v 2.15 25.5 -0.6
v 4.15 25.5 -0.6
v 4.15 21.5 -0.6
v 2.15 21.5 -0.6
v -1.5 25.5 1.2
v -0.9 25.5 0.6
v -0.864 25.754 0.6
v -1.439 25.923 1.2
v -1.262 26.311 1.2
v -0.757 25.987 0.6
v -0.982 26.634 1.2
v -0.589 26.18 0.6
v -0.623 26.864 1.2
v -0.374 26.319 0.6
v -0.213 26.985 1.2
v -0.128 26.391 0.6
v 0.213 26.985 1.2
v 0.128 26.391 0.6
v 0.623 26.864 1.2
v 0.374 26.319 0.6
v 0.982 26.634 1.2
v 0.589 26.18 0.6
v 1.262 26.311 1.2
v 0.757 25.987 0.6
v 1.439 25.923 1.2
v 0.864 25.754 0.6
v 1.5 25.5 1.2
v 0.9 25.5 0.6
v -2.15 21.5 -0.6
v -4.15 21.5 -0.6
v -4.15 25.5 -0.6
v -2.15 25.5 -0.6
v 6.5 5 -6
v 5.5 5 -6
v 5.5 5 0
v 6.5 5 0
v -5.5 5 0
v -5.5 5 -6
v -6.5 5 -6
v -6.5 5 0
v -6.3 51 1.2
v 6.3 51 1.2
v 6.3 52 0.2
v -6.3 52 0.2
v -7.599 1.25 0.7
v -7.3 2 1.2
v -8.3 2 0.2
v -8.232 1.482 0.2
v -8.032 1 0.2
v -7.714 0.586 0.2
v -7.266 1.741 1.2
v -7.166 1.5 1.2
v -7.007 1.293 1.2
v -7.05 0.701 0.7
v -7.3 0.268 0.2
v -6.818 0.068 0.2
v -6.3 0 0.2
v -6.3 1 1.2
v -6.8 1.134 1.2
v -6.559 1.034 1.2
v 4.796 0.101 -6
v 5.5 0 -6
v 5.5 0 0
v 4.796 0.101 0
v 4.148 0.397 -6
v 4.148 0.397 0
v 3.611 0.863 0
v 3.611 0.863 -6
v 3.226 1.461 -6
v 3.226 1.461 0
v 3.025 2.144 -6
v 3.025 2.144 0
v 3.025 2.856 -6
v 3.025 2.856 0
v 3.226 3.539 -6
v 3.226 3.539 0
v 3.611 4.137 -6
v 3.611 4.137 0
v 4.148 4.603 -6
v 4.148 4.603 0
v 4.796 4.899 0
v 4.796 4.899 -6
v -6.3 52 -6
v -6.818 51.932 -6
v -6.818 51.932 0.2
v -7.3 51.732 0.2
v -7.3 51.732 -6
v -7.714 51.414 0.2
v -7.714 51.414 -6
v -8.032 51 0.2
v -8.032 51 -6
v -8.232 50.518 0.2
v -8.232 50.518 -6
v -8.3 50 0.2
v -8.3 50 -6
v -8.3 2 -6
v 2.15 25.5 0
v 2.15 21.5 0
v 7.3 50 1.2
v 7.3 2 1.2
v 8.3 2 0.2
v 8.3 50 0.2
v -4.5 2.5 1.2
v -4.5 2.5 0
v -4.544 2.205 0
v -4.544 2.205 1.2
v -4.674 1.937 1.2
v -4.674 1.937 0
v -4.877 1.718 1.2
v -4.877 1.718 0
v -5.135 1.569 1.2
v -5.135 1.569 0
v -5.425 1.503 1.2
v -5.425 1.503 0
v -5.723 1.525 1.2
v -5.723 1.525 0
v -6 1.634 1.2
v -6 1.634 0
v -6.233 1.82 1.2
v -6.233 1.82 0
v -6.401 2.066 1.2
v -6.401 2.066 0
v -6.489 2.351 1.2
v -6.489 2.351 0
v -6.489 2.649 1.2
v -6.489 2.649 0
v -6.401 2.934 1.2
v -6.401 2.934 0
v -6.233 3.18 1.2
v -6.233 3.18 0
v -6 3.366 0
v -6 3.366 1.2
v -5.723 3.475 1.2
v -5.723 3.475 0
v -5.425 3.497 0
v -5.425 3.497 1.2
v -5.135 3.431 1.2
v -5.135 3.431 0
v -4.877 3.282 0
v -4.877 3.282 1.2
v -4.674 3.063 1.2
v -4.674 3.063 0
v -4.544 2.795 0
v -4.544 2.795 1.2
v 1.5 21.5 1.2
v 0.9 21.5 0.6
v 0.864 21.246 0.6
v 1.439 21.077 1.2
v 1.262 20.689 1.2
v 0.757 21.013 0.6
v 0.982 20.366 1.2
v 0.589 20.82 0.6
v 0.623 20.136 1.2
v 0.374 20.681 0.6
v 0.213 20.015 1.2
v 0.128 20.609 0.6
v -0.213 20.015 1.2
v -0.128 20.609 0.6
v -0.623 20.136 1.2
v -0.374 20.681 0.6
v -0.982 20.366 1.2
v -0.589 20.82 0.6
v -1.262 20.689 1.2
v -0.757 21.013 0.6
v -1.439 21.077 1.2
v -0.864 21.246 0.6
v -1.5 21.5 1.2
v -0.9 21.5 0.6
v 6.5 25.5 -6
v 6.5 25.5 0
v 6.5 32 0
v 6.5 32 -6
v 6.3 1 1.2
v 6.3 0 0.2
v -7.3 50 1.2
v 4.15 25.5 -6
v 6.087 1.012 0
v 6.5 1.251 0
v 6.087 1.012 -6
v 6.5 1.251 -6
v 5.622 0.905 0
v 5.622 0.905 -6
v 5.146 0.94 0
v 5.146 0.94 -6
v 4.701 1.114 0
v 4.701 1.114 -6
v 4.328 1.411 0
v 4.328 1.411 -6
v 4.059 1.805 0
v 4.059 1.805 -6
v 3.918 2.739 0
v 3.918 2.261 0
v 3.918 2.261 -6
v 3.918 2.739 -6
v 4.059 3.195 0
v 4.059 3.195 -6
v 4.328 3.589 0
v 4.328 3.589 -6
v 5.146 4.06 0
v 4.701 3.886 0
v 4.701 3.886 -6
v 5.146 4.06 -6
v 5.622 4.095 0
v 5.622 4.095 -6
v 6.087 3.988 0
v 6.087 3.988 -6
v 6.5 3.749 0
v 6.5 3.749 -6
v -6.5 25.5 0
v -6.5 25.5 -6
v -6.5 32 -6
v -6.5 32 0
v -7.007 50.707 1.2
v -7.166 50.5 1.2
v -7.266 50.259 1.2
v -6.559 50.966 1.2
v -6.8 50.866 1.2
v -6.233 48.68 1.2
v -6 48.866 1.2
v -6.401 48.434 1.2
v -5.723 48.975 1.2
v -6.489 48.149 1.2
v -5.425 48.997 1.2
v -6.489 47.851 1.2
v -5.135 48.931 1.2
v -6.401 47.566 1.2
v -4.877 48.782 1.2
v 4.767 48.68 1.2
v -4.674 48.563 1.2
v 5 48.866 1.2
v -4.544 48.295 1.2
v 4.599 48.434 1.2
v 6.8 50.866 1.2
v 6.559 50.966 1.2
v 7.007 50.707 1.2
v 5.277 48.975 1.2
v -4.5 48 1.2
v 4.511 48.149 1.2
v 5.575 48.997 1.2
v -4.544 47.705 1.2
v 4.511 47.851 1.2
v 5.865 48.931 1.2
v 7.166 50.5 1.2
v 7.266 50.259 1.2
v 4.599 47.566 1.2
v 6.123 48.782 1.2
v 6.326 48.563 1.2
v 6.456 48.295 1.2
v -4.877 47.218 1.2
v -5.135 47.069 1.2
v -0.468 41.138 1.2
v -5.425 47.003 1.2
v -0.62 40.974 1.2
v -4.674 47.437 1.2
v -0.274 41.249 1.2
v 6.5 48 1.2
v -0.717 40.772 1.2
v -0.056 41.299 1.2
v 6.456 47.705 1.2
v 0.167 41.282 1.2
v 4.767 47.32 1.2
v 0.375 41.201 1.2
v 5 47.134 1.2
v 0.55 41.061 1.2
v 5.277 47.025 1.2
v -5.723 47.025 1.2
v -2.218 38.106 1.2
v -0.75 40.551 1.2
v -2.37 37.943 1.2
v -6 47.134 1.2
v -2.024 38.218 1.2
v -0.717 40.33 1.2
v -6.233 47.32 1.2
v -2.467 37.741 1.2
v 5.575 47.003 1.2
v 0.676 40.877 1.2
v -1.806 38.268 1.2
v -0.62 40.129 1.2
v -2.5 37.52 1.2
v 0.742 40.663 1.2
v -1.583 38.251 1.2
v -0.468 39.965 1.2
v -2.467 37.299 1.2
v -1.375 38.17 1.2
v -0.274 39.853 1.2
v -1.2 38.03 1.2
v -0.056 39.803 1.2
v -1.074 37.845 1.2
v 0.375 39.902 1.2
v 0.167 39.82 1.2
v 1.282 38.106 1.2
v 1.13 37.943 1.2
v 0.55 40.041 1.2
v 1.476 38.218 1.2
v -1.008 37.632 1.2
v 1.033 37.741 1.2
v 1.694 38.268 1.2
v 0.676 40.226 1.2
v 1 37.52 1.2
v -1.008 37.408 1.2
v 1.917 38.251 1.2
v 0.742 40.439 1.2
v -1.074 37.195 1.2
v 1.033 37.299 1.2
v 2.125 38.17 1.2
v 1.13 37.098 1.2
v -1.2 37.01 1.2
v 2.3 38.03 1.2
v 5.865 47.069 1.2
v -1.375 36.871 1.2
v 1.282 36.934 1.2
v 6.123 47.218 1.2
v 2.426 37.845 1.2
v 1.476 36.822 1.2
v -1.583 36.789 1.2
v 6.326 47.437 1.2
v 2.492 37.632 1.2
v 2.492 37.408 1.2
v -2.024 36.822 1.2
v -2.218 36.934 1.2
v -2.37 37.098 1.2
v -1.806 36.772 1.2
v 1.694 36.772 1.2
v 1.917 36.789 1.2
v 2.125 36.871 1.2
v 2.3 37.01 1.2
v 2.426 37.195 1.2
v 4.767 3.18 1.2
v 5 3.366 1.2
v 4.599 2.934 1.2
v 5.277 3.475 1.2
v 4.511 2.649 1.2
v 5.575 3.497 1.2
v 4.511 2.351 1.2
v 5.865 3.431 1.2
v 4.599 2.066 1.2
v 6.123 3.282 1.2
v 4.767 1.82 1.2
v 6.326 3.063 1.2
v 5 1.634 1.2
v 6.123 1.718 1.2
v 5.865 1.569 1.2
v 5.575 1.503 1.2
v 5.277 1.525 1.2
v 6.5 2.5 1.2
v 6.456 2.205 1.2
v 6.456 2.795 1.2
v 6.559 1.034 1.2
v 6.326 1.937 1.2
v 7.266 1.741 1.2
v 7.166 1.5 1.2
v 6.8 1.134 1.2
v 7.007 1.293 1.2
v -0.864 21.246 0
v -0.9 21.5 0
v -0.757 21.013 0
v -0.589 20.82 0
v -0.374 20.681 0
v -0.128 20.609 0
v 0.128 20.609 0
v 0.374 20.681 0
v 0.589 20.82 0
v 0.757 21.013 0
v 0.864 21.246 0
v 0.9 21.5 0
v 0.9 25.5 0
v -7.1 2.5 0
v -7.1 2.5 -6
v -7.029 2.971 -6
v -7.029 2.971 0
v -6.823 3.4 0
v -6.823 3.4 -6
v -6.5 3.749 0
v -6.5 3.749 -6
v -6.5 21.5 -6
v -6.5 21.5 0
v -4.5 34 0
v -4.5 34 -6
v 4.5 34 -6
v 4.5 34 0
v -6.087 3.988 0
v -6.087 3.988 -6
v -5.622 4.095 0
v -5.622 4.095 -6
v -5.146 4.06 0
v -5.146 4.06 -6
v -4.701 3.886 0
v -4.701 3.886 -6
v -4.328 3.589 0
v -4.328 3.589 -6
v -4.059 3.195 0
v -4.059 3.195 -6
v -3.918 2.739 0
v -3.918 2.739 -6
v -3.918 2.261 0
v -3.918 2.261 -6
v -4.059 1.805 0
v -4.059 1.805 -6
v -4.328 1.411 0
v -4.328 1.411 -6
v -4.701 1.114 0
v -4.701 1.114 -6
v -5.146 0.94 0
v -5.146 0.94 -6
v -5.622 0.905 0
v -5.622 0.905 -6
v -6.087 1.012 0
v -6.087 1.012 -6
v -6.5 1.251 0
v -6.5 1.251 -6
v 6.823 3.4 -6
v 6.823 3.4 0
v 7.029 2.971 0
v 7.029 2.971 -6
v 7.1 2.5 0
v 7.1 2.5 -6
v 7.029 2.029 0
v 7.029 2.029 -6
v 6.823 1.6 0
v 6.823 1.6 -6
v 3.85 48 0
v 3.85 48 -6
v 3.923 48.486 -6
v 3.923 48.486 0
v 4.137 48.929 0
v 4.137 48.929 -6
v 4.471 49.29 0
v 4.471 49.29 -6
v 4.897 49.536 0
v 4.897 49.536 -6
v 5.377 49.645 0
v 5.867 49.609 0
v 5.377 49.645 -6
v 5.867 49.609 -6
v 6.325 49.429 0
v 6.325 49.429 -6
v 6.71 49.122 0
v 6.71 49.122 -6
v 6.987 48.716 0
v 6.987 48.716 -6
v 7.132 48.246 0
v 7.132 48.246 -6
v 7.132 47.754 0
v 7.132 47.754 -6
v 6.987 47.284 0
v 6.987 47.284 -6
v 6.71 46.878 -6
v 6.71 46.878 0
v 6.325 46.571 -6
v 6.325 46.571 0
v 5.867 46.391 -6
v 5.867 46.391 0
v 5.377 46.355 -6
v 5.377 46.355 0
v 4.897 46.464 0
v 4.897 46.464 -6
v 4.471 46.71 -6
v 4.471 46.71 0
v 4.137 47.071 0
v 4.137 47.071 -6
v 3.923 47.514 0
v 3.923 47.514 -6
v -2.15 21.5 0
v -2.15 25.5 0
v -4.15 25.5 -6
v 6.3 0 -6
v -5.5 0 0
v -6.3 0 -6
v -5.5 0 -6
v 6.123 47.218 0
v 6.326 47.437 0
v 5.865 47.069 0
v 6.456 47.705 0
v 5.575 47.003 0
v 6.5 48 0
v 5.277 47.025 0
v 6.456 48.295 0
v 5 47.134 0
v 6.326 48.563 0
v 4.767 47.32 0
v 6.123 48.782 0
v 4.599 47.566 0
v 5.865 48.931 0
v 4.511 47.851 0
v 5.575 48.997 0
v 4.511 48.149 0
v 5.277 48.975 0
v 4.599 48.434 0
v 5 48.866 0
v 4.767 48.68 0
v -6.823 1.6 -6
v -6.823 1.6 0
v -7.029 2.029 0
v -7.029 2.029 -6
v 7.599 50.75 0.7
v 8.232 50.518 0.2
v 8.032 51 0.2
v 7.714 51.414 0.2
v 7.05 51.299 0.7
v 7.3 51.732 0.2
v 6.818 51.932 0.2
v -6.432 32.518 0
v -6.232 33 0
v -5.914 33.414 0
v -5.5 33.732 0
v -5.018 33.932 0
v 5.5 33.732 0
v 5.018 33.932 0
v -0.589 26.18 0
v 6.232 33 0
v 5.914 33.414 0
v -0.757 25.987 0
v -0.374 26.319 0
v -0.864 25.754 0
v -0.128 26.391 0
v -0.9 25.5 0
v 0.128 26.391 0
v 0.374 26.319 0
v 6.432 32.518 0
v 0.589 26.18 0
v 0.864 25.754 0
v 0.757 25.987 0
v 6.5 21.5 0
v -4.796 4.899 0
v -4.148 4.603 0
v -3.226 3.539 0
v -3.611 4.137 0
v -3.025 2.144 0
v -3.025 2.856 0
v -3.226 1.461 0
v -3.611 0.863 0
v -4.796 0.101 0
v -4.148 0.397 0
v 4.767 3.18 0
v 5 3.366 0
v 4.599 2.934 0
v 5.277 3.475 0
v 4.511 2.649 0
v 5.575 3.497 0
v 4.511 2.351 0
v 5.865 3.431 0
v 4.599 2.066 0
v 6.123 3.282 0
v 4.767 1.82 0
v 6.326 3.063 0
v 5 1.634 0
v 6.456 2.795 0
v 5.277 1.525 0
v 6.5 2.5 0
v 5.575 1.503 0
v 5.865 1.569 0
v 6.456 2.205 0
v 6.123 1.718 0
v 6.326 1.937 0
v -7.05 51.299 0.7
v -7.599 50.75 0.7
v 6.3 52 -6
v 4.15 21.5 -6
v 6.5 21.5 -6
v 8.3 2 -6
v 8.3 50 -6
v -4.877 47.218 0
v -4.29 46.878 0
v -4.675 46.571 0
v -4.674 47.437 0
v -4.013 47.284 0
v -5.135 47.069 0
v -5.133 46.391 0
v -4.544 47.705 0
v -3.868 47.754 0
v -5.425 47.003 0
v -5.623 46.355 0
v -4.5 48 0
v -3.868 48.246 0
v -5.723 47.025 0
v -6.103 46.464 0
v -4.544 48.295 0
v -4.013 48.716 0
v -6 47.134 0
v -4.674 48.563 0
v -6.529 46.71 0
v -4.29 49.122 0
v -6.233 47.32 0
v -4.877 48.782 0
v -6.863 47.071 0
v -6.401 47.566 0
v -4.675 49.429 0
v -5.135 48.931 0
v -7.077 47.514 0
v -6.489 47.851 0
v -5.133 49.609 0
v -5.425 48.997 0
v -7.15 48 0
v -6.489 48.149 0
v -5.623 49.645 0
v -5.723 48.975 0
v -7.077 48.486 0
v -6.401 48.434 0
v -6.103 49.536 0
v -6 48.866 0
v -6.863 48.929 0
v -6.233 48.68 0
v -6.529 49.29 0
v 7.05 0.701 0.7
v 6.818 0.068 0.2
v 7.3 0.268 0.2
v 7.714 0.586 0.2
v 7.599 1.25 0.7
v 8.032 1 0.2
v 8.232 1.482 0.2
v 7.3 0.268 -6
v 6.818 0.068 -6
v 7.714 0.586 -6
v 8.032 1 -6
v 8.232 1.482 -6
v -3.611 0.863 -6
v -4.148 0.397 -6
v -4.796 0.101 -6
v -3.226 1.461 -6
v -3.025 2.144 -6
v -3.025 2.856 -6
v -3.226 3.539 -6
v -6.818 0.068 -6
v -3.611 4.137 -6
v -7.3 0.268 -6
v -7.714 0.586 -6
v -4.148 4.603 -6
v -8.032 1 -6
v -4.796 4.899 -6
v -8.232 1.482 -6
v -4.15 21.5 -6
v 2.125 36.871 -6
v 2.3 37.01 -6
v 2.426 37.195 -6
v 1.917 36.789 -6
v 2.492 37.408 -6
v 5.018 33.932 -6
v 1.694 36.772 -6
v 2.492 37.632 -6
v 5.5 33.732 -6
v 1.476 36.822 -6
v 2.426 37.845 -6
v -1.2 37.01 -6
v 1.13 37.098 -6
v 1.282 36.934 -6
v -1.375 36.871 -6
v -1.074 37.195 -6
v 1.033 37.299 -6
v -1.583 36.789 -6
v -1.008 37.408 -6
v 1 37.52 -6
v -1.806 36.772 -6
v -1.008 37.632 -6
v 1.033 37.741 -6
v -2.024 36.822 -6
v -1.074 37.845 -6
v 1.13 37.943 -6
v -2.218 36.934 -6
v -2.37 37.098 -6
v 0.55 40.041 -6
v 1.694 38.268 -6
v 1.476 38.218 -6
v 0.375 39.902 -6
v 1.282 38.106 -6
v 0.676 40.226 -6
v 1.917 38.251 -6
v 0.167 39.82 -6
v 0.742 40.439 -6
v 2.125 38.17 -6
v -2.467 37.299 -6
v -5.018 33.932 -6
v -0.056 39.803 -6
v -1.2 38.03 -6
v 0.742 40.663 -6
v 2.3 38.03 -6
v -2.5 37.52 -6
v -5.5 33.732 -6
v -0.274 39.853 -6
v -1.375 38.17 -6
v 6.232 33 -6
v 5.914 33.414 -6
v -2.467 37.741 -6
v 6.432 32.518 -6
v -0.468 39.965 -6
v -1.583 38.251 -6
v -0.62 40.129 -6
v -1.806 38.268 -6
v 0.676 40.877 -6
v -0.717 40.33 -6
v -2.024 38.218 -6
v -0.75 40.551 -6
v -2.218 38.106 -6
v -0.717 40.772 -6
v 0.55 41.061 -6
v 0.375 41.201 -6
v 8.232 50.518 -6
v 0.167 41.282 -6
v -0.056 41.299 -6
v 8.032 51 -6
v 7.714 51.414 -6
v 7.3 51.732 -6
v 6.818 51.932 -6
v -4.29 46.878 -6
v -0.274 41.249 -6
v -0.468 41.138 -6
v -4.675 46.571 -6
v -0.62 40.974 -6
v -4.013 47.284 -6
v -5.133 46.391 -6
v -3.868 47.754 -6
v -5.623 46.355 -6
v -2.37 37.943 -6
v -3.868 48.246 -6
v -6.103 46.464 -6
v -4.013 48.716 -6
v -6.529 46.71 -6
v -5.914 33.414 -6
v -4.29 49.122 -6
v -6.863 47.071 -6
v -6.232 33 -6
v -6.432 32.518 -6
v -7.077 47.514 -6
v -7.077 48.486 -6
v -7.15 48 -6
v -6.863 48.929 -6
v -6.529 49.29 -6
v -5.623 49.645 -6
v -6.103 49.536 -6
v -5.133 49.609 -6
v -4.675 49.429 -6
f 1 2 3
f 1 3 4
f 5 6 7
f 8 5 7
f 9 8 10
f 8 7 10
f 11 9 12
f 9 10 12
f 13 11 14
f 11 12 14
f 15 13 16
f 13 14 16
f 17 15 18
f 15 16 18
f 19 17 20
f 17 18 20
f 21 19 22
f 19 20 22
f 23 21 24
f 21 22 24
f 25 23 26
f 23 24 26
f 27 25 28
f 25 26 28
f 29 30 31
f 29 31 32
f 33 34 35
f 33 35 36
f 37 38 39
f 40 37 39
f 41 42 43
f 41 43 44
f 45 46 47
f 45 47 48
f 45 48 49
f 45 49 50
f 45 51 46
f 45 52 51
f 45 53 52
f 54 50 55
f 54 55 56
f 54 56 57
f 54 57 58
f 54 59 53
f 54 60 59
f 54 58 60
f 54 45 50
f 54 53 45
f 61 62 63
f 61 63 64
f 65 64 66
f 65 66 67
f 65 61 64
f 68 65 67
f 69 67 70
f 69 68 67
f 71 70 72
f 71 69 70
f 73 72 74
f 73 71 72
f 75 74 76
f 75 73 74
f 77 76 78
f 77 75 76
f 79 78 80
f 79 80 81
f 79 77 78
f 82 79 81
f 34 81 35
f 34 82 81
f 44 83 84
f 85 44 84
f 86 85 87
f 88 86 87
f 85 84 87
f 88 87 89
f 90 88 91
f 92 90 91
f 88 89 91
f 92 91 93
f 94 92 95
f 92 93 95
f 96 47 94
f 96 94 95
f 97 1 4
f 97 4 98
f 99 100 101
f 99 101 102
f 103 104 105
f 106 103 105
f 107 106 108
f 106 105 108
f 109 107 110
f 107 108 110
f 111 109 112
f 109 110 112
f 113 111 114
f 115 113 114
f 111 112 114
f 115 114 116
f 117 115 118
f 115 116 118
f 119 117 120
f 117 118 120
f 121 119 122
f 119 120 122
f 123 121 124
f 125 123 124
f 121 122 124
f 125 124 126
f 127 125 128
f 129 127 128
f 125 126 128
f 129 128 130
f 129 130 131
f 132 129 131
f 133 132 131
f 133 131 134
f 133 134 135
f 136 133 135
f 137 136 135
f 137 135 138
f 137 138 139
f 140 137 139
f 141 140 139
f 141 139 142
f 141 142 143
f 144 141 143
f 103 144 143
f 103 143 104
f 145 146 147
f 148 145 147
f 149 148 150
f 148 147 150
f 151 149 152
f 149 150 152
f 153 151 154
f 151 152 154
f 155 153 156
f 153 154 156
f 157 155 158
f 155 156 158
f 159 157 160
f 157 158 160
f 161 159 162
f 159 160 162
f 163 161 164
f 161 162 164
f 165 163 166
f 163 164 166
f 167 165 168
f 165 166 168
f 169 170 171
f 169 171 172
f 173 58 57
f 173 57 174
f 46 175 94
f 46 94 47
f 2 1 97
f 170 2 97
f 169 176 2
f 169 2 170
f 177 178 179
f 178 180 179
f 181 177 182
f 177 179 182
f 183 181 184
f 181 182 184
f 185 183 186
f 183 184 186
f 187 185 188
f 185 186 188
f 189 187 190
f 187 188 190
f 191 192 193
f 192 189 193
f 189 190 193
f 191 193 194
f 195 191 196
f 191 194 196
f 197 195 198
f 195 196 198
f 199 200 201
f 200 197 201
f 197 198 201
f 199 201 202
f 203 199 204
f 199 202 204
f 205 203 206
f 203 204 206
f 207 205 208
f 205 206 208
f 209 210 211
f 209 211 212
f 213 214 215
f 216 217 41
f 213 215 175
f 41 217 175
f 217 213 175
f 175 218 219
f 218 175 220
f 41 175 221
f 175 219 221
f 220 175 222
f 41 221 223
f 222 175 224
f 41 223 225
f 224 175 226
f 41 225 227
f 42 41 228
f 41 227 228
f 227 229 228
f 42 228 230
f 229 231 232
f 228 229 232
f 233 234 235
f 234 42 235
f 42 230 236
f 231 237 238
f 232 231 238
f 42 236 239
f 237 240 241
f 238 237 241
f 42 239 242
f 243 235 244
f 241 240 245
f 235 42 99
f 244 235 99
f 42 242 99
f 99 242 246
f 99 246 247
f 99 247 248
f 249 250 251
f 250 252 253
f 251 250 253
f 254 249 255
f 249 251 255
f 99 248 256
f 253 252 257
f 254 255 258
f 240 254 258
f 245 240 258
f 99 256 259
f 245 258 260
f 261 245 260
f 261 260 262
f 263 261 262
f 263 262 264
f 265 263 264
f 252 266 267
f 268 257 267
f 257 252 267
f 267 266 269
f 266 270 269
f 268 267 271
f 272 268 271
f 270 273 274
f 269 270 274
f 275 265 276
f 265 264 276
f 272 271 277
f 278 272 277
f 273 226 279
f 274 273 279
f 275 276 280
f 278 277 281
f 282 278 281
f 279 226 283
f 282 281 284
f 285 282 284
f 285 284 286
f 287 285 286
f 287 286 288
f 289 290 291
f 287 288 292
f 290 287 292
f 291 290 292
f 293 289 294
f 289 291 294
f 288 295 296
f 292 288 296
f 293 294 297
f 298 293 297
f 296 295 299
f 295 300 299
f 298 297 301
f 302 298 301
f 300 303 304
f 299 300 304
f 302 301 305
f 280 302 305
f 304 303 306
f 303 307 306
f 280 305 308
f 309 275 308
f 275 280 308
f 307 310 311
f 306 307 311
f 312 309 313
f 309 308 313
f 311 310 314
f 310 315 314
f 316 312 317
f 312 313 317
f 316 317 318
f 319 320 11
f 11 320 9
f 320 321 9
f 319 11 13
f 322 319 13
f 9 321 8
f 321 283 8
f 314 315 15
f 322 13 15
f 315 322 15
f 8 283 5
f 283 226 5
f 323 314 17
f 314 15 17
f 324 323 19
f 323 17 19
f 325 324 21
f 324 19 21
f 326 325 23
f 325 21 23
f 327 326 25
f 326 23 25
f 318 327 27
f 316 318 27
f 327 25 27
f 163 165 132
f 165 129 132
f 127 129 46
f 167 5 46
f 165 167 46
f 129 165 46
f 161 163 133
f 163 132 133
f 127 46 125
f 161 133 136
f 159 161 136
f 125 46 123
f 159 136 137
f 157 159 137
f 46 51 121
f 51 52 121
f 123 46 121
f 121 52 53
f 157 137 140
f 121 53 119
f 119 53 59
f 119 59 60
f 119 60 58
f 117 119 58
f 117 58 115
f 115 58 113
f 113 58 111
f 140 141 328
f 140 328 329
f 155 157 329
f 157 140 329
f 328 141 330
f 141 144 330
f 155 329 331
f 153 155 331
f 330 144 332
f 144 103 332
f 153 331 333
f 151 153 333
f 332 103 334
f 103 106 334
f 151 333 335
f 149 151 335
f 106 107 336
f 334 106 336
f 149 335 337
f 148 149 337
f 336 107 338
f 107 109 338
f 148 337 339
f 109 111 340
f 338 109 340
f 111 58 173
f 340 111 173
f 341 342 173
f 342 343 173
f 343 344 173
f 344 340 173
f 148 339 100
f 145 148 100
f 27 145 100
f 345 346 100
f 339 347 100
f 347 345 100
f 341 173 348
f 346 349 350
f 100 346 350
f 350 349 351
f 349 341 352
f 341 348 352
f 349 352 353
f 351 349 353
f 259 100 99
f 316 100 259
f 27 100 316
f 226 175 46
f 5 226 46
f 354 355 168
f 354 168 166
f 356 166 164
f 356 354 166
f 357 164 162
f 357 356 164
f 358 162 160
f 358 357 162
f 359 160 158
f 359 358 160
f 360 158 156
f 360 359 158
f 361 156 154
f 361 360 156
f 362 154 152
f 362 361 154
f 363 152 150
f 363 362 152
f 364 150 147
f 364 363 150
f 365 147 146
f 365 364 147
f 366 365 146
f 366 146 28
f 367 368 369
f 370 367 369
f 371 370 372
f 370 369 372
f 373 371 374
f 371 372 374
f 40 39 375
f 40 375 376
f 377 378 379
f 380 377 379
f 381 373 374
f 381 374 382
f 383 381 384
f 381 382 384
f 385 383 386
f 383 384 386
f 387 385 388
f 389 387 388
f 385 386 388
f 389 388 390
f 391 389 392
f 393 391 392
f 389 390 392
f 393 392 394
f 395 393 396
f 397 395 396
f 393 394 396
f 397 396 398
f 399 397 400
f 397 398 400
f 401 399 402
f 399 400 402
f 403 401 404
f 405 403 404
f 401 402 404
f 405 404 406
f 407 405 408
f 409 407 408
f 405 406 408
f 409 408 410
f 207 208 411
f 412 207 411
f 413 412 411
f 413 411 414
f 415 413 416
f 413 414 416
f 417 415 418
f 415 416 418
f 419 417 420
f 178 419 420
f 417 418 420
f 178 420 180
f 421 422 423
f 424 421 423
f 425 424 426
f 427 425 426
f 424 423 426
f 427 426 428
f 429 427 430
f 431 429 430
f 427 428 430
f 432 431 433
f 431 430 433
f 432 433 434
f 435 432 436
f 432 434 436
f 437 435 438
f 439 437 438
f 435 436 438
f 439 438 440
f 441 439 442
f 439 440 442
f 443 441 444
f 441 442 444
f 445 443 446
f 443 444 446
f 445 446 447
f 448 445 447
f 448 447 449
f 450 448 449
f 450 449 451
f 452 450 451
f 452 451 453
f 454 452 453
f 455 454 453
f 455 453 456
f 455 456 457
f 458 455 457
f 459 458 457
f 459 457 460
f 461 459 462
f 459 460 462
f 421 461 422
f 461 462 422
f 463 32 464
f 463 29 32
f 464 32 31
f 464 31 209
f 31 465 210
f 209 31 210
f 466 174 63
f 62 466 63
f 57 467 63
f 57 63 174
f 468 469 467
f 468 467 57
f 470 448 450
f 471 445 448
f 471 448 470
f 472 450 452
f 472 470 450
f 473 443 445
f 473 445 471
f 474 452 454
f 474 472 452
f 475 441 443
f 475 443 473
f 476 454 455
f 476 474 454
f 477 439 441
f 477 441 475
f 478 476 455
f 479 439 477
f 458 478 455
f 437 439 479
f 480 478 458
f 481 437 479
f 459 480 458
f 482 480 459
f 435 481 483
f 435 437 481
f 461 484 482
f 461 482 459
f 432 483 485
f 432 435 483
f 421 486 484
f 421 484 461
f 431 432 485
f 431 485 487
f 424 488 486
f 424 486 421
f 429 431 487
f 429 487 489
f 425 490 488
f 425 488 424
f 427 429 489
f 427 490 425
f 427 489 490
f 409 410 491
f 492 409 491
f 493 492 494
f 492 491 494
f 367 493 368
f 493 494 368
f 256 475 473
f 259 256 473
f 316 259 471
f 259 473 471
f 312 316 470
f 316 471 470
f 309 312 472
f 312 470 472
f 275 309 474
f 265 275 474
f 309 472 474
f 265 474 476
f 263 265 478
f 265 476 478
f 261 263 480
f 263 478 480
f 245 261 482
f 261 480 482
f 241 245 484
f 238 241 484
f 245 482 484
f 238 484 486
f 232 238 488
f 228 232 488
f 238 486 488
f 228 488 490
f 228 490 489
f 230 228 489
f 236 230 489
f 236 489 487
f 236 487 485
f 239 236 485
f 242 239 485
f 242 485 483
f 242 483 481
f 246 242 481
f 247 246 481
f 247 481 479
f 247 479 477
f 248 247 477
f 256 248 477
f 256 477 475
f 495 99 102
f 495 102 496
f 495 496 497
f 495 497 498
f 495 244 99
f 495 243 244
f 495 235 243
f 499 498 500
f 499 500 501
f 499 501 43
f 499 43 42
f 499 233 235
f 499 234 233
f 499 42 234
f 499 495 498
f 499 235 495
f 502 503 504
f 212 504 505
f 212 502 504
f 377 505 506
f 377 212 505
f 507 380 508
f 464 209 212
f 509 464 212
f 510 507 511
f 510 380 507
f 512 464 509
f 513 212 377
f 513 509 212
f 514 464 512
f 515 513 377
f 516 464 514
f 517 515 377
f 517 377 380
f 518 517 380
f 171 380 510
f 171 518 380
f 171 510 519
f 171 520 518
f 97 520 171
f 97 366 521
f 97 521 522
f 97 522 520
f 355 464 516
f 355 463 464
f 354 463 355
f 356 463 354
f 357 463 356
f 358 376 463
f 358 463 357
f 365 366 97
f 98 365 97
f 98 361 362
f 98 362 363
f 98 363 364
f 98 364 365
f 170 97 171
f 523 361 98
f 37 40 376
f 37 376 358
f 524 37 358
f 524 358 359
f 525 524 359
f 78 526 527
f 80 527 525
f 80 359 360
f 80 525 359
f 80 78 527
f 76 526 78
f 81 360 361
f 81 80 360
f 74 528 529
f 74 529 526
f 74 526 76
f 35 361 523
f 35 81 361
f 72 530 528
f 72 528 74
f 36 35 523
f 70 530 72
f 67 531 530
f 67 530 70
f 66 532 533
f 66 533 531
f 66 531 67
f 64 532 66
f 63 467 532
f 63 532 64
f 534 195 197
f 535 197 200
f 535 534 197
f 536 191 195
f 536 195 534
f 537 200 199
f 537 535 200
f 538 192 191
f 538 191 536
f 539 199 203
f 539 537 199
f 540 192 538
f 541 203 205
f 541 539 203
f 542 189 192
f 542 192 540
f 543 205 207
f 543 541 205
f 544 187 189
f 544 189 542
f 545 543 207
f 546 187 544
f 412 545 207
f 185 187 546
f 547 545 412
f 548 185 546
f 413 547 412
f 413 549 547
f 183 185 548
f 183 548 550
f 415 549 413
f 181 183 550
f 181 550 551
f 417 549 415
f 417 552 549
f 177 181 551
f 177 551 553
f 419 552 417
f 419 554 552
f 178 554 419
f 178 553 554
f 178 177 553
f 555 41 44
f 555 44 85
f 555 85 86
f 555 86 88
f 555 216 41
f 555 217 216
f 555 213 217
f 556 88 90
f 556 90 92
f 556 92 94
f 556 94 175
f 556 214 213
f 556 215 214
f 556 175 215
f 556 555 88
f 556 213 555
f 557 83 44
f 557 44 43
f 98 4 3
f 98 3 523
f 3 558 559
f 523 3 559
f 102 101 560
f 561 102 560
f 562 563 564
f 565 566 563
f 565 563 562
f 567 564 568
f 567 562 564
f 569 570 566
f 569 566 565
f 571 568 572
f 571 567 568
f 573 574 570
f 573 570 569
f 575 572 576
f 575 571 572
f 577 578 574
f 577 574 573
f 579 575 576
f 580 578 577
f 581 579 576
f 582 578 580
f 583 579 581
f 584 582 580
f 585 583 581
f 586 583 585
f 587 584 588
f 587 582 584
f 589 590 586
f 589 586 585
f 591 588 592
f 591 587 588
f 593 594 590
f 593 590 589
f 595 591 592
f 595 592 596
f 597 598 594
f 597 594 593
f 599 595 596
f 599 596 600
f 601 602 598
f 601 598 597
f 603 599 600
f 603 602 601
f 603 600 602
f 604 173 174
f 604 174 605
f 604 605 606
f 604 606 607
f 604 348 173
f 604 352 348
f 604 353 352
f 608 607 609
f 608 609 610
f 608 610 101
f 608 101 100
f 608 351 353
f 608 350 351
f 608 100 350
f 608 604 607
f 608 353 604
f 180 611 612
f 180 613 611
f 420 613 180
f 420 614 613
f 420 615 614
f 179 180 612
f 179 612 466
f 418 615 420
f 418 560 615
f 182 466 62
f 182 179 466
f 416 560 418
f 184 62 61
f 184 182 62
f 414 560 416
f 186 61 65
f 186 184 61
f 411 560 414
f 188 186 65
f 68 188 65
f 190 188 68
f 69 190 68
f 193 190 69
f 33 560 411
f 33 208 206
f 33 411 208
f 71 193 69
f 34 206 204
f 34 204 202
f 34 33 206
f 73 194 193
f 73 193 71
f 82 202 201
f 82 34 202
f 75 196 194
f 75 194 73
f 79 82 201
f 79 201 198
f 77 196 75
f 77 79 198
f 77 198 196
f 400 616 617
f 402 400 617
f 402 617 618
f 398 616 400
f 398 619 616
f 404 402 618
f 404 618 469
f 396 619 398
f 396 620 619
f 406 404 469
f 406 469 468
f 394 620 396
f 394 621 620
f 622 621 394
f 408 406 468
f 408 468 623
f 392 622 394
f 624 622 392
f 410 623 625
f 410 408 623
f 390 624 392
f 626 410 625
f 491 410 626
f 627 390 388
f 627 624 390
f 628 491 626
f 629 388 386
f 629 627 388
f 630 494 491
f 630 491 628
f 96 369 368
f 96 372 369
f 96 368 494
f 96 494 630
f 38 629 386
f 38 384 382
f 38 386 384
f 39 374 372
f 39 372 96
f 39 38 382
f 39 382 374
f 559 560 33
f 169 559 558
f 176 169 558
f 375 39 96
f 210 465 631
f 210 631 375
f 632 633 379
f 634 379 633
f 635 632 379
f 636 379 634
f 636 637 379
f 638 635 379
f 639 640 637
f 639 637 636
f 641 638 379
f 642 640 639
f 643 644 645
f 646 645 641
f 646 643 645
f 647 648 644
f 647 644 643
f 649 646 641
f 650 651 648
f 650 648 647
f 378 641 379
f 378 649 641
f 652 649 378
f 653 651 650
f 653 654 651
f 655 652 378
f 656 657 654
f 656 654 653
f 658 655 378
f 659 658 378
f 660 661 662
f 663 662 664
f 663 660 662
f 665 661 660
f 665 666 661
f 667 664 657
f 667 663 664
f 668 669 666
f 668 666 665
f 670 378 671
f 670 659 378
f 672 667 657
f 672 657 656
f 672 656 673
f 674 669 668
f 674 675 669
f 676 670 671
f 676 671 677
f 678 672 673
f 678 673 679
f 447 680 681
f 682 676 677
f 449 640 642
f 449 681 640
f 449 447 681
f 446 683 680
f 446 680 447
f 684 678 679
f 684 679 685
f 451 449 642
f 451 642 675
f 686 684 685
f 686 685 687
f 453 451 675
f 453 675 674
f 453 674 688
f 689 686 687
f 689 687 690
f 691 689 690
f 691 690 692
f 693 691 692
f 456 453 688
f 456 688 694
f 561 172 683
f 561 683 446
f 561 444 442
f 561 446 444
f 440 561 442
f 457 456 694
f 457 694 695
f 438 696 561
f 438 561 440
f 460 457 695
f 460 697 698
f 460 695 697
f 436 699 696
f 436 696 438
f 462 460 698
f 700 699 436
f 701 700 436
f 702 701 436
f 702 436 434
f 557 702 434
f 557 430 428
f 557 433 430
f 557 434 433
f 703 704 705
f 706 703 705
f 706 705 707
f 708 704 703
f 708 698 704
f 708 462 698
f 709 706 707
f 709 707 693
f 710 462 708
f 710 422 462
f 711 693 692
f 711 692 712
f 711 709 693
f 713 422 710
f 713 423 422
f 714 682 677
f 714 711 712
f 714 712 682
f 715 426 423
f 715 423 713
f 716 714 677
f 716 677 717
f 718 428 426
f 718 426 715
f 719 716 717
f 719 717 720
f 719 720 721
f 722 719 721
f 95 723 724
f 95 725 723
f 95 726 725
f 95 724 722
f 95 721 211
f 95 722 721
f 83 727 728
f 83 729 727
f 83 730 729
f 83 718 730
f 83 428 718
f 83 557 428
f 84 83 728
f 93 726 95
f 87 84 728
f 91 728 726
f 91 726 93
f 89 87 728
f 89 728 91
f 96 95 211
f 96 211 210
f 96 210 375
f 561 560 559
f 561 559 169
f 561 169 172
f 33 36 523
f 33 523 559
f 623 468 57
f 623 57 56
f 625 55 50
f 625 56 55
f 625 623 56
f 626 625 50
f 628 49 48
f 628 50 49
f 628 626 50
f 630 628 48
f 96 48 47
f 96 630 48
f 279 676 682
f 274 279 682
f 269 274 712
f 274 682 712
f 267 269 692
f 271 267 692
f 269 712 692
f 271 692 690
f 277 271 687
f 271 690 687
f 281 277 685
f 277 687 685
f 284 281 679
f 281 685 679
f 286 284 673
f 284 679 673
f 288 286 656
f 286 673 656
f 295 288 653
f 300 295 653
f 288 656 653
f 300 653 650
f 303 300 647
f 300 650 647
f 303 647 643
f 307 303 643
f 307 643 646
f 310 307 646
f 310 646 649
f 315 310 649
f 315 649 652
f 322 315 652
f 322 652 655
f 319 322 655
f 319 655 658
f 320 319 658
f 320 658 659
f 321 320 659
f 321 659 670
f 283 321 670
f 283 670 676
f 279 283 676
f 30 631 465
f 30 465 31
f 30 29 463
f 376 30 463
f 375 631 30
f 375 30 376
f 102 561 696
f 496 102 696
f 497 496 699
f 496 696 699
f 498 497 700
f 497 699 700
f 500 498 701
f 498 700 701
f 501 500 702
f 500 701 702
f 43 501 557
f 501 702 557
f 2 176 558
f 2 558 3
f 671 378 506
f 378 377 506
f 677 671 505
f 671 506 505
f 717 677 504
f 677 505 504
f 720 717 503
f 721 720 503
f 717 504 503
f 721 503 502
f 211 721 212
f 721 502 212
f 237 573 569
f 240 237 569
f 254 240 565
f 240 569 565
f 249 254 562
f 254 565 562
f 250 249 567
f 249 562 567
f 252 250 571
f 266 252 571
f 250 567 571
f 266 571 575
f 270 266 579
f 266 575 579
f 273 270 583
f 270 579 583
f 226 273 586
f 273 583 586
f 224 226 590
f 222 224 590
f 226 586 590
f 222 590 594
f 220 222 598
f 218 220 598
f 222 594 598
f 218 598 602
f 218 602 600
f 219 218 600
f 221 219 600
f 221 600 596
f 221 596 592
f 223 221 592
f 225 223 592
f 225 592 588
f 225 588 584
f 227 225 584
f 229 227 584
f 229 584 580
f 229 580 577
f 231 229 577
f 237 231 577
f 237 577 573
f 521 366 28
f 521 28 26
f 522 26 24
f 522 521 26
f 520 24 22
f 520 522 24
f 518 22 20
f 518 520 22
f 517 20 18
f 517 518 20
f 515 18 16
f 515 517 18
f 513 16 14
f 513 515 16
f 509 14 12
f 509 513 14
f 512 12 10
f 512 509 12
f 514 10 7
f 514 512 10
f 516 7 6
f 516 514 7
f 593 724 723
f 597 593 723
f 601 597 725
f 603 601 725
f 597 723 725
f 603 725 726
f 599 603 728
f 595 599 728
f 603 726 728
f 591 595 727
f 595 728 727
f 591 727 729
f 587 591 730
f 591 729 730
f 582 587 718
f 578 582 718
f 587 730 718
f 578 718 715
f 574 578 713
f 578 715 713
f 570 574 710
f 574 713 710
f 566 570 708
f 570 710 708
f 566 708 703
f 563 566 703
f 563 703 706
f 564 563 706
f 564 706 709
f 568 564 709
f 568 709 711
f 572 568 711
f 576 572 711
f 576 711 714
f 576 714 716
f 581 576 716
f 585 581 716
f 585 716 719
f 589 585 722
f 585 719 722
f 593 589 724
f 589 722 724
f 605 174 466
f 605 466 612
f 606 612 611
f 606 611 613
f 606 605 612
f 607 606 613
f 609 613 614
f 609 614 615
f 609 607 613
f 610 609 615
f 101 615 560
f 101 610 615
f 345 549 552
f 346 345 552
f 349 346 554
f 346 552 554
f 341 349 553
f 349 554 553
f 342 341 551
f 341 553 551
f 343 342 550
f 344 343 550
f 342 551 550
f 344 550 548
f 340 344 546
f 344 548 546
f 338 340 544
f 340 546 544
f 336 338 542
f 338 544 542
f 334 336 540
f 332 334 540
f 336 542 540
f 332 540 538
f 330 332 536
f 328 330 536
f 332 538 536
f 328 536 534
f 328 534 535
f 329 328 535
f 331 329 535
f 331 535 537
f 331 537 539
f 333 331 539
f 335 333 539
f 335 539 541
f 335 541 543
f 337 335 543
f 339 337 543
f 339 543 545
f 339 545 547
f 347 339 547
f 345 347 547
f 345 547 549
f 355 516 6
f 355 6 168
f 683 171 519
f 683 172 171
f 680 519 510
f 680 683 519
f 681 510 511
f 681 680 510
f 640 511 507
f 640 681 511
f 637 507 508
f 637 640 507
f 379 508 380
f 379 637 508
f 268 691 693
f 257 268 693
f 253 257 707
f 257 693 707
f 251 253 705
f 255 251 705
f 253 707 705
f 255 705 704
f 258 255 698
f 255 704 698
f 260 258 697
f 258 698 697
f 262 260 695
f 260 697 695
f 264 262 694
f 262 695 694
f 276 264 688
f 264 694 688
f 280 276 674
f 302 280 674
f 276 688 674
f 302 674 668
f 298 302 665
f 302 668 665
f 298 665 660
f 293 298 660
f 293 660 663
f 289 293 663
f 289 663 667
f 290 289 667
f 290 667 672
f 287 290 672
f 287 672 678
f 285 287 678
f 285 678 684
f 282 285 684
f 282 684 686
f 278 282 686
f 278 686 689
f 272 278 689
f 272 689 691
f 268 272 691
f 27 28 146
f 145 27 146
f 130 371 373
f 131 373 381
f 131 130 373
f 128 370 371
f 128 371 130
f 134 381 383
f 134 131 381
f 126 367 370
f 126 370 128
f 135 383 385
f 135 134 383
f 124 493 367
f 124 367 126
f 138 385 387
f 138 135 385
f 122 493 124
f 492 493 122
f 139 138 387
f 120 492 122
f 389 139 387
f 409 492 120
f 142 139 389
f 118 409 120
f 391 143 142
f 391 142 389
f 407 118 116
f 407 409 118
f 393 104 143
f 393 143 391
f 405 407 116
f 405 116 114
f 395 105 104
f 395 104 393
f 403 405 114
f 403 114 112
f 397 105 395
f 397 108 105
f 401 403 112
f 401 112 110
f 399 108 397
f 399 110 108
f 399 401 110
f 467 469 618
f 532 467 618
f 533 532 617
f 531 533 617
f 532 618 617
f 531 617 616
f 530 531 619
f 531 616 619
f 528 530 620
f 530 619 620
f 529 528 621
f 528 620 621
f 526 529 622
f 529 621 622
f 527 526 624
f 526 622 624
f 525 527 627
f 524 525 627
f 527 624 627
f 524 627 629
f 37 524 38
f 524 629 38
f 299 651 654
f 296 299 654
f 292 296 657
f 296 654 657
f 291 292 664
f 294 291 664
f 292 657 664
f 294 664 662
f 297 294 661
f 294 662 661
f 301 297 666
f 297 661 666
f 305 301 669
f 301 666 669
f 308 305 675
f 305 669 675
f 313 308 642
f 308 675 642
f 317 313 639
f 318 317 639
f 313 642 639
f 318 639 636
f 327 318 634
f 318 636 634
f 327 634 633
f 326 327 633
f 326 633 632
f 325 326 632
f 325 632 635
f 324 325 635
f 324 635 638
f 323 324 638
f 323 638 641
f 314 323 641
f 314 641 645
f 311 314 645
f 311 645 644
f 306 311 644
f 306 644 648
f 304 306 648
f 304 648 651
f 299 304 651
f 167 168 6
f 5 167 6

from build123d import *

# Parameters (mm, degrees)
EXTRUDE_1_DEPTH          = 34
SKETCH_2_W               = 16.6
SKETCH_2_H               = 7.2
EXTRUDE_2_DEPTH          = 18
CUT_EXTRUDE_2_DEPTH      = 2.2
CHAMFER_1_SIZE           = 0.6
EXTRUDE_4_DEPTH          = 2
SKETCH_8_R               = 1.6
EXTRUDE_5_DEPTH          = 6
CUT_EXTRUDE_4_DEPTH      = 6
SKETCH_9_R               = 1
CUT_EXTRUDE_5_DEPTH      = 7
CUT_EXTRUDE_5_DEPTH_BACK = 4
SKETCH_10_R              = 1.65
CUT_EXTRUDE_6_DEPTH      = 6
FILLET_1_R               = 2
SKETCH_13_R              = 0.75
CUT_EXTRUDE_9_DEPTH      = 8.2
FILLET_2_R               = 2
CHAMFER_2_SIZE           = 1


with BuildPart() as part:
    # Sketch 1 → Extrude 1 (new body)
    with BuildSketch(Plane(origin=(0, 0, 0), x_dir=(1, 0, 0), z_dir=(0, 1, 0))):
        Polygon((-6.5, 0), (6.5, 0), (6.5, 6), (8.3, 6), (8.3, -1.2), (-8.3, -1.2), (-8.3, 6), (-6.5, 6), align=None)
    extrude(amount=EXTRUDE_1_DEPTH)

    # Sketch 2 → Extrude 2 (add)
    with BuildSketch(Plane(origin=(0, 34, 0), x_dir=(1, 0, 0), z_dir=(0, 1, 0))):
        with Locations((0, 2.4)):
            Rectangle(SKETCH_2_W, SKETCH_2_H)
    extrude(amount=EXTRUDE_2_DEPTH)

    # Sketch 4 → Cut-Extrude 2 (cut, through all)
    with BuildSketch(Plane(origin=(0, 0, 0), x_dir=(-1, 0, 0), z_dir=(0, 0, -1))):
        with BuildLine():
            Line((0.9, 25.5), (0.9, 21.5))
            ThreePointArc((0.9, 21.5), (0, 20.6), (-0.9, 21.5))
            Line((-0.9, 21.5), (-0.9, 25.5))
            ThreePointArc((-0.9, 25.5), (0, 26.4), (0.9, 25.5))
        make_face()
    extrude(amount=-CUT_EXTRUDE_2_DEPTH, mode=Mode.SUBTRACT)

    # Chamfer 1
    chamfer_1_edges = [part.edges().sort_by_distance(p)[0] for p in [
        (0, 26.4, 1.2),
        (-0.9, 23.5, 1.2),
        (0, 20.6, 1.2),
        (0.9, 23.5, 1.2),
    ]]
    chamfer(chamfer_1_edges, length=CHAMFER_1_SIZE)

    # Sketch 5 → Extrude 4 (add, symmetric)
    with BuildSketch(Plane(origin=(0, 23.5, 0), x_dir=(-1, 0, 0), z_dir=(0, -1, 0))):
        Polygon((-6.5, 6), (-4.15, 6), (-4.15, 0.6), (-2.15, 0.6), (-2.15, 0), (-6.5, 0), align=None)
        Polygon((6.5, 0), (6.5, 6), (4.15, 6), (4.15, 0.6), (2.15, 0.6), (2.15, 0), align=None)
    extrude(amount=EXTRUDE_4_DEPTH, both=True)

    # Sketch 8 → Extrude 5 (add)
    with BuildSketch(Plane(origin=(0, 0, -6), x_dir=(-1, 0, 0), z_dir=(0, 0, -1))):
        with BuildLine():
            Line((-5.5, 5), (-8.3, 5))
            Line((-8.3, 5), (-8.3, 0))
            Line((-8.3, 0), (-5.5, 0))
            ThreePointArc((-5.5, 0), (-3, 2.5), (-5.5, 5))
        make_face()
        with Locations((-5.5, 2.5)):
            Circle(SKETCH_8_R, mode=Mode.SUBTRACT)
        with BuildLine():
            Line((8.3, 0), (5.5, 0))
            ThreePointArc((5.5, 0), (3, 2.5), (5.5, 5))
            Line((5.5, 5), (8.3, 5))
            Line((8.3, 5), (8.3, 0))
        make_face()
        with Locations((5.5, 2.5)):
            Circle(SKETCH_8_R, mode=Mode.SUBTRACT)
    extrude(amount=-EXTRUDE_5_DEPTH)

    # Sketch 8_2 → Cut-Extrude 4 (cut)
    with BuildSketch(Plane(origin=(0, 0, -6), x_dir=(-1, 0, 0), z_dir=(0, 0, -1))):
        with BuildLine():
            Line((-6.5, 1.2510004), (-6.5, 3.7489996))
            ThreePointArc((-6.5, 3.7489996), (-7.1, 2.5), (-6.5, 1.2510004))
        make_face()
        with BuildLine():
            ThreePointArc((-3.9, 2.5), (-4.807179677, 3.94222051), (-6.5, 3.7489996))
            Line((-6.5, 3.7489996), (-6.5, 1.2510004))
            ThreePointArc((-6.5, 1.2510004), (-4.807179677, 1.05777949), (-3.9, 2.5))
        make_face()
        with BuildLine():
            Line((6.5, 3.7489996), (6.5, 1.2510004))
            ThreePointArc((6.5, 1.2510004), (6.94222051, 1.807179677), (7.1, 2.5))
            ThreePointArc((7.1, 2.5), (6.94222051, 3.192820323), (6.5, 3.7489996))
        make_face()
        with BuildLine():
            ThreePointArc((6.5, 3.7489996), (3.9, 2.5), (6.5, 1.2510004))
            Line((6.5, 1.2510004), (6.5, 3.7489996))
        make_face()
    extrude(amount=-CUT_EXTRUDE_4_DEPTH, mode=Mode.SUBTRACT)

    # Sketch 9 → Cut-Extrude 5 (cut, two sides)
    with BuildSketch(Plane(origin=(0, 0, 0), x_dir=(-1, 0, 0), z_dir=(0, 0, -1))) as cut_extrude_5_sk:
        with Locations(Location((-5.5, 2.5, 0), (0, 0, 180))):  # turned: the seam where the file's is
            Circle(SKETCH_9_R)
        with Locations(Location((5.5, 2.5, 0), (0, 0, 180))):  # turned: the seam where the file's is
            Circle(SKETCH_9_R)
        with Locations(Location((5.5, 48, 0), (0, 0, 180))):  # turned: the seam where the file's is
            Circle(SKETCH_9_R)
        with Locations(Location((-5.5, 48, 0), (0, 0, 180))):  # turned: the seam where the file's is
            Circle(SKETCH_9_R)
    extrude(amount=CUT_EXTRUDE_5_DEPTH, mode=Mode.SUBTRACT)
    extrude(cut_extrude_5_sk.sketch, amount=-CUT_EXTRUDE_5_DEPTH_BACK, mode=Mode.SUBTRACT)

    # Sketch 10 → Cut-Extrude 6 (cut)
    with BuildSketch(Plane(origin=(0, 0, -6), x_dir=(-1, 0, 0), z_dir=(0, 0, -1))):
        with Locations((-5.5, 48)):
            Circle(SKETCH_10_R)
        with Locations((5.5, 48)):
            Circle(SKETCH_10_R)
    extrude(amount=-CUT_EXTRUDE_6_DEPTH, mode=Mode.SUBTRACT)

    # Fillet 1
    fillet_1_edges = [part.edges().sort_by_distance(p)[0] for p in [
        (-6.5, 34, -3),
        (6.5, 34, -3),
    ]]
    fillet(fillet_1_edges, radius=FILLET_1_R)

    # Sketch 13 → Cut-Extrude 9 (cut, through all)
    with BuildSketch(Plane(origin=(0, 0, -6), x_dir=(-1, 0, 0), z_dir=(0, 0, -1))):
        with Locations((0, 40.551155153)):
            Circle(SKETCH_13_R)
        with Locations((-1.75, 37.52006624)):
            Circle(SKETCH_13_R)
        with Locations((1.75, 37.52006624)):
            Circle(SKETCH_13_R)
    extrude(amount=-CUT_EXTRUDE_9_DEPTH, mode=Mode.SUBTRACT)

    # Fillet 2
    fillet_2_edges = [part.edges().sort_by_distance(p)[0] for p in [
        (-8.3, 52, -2.4),
        (8.3, 52, -2.4),
        (8.3, 0, -2.4),
        (-8.3, 0, -2.4),
    ]]
    fillet(fillet_2_edges, radius=FILLET_2_R)

    # Chamfer 2
    chamfer_2_edges = [part.edges().sort_by_distance(p)[0] for p in [
        (8.3, 26, 1.2),
        (0, 0, 1.2),
        (0, 52, 1.2),
        (-8.3, 26, 1.2),
        (-7.714213562, 51.414213562, 1.2),
        (7.714213562, 51.414213562, 1.2),
        (-7.714213562, 0.585786438, 1.2),
        (7.714213562, 0.585786438, 1.2),
    ]]
    chamfer(chamfer_2_edges, length=CHAMFER_2_SIZE)


solid = part.part
